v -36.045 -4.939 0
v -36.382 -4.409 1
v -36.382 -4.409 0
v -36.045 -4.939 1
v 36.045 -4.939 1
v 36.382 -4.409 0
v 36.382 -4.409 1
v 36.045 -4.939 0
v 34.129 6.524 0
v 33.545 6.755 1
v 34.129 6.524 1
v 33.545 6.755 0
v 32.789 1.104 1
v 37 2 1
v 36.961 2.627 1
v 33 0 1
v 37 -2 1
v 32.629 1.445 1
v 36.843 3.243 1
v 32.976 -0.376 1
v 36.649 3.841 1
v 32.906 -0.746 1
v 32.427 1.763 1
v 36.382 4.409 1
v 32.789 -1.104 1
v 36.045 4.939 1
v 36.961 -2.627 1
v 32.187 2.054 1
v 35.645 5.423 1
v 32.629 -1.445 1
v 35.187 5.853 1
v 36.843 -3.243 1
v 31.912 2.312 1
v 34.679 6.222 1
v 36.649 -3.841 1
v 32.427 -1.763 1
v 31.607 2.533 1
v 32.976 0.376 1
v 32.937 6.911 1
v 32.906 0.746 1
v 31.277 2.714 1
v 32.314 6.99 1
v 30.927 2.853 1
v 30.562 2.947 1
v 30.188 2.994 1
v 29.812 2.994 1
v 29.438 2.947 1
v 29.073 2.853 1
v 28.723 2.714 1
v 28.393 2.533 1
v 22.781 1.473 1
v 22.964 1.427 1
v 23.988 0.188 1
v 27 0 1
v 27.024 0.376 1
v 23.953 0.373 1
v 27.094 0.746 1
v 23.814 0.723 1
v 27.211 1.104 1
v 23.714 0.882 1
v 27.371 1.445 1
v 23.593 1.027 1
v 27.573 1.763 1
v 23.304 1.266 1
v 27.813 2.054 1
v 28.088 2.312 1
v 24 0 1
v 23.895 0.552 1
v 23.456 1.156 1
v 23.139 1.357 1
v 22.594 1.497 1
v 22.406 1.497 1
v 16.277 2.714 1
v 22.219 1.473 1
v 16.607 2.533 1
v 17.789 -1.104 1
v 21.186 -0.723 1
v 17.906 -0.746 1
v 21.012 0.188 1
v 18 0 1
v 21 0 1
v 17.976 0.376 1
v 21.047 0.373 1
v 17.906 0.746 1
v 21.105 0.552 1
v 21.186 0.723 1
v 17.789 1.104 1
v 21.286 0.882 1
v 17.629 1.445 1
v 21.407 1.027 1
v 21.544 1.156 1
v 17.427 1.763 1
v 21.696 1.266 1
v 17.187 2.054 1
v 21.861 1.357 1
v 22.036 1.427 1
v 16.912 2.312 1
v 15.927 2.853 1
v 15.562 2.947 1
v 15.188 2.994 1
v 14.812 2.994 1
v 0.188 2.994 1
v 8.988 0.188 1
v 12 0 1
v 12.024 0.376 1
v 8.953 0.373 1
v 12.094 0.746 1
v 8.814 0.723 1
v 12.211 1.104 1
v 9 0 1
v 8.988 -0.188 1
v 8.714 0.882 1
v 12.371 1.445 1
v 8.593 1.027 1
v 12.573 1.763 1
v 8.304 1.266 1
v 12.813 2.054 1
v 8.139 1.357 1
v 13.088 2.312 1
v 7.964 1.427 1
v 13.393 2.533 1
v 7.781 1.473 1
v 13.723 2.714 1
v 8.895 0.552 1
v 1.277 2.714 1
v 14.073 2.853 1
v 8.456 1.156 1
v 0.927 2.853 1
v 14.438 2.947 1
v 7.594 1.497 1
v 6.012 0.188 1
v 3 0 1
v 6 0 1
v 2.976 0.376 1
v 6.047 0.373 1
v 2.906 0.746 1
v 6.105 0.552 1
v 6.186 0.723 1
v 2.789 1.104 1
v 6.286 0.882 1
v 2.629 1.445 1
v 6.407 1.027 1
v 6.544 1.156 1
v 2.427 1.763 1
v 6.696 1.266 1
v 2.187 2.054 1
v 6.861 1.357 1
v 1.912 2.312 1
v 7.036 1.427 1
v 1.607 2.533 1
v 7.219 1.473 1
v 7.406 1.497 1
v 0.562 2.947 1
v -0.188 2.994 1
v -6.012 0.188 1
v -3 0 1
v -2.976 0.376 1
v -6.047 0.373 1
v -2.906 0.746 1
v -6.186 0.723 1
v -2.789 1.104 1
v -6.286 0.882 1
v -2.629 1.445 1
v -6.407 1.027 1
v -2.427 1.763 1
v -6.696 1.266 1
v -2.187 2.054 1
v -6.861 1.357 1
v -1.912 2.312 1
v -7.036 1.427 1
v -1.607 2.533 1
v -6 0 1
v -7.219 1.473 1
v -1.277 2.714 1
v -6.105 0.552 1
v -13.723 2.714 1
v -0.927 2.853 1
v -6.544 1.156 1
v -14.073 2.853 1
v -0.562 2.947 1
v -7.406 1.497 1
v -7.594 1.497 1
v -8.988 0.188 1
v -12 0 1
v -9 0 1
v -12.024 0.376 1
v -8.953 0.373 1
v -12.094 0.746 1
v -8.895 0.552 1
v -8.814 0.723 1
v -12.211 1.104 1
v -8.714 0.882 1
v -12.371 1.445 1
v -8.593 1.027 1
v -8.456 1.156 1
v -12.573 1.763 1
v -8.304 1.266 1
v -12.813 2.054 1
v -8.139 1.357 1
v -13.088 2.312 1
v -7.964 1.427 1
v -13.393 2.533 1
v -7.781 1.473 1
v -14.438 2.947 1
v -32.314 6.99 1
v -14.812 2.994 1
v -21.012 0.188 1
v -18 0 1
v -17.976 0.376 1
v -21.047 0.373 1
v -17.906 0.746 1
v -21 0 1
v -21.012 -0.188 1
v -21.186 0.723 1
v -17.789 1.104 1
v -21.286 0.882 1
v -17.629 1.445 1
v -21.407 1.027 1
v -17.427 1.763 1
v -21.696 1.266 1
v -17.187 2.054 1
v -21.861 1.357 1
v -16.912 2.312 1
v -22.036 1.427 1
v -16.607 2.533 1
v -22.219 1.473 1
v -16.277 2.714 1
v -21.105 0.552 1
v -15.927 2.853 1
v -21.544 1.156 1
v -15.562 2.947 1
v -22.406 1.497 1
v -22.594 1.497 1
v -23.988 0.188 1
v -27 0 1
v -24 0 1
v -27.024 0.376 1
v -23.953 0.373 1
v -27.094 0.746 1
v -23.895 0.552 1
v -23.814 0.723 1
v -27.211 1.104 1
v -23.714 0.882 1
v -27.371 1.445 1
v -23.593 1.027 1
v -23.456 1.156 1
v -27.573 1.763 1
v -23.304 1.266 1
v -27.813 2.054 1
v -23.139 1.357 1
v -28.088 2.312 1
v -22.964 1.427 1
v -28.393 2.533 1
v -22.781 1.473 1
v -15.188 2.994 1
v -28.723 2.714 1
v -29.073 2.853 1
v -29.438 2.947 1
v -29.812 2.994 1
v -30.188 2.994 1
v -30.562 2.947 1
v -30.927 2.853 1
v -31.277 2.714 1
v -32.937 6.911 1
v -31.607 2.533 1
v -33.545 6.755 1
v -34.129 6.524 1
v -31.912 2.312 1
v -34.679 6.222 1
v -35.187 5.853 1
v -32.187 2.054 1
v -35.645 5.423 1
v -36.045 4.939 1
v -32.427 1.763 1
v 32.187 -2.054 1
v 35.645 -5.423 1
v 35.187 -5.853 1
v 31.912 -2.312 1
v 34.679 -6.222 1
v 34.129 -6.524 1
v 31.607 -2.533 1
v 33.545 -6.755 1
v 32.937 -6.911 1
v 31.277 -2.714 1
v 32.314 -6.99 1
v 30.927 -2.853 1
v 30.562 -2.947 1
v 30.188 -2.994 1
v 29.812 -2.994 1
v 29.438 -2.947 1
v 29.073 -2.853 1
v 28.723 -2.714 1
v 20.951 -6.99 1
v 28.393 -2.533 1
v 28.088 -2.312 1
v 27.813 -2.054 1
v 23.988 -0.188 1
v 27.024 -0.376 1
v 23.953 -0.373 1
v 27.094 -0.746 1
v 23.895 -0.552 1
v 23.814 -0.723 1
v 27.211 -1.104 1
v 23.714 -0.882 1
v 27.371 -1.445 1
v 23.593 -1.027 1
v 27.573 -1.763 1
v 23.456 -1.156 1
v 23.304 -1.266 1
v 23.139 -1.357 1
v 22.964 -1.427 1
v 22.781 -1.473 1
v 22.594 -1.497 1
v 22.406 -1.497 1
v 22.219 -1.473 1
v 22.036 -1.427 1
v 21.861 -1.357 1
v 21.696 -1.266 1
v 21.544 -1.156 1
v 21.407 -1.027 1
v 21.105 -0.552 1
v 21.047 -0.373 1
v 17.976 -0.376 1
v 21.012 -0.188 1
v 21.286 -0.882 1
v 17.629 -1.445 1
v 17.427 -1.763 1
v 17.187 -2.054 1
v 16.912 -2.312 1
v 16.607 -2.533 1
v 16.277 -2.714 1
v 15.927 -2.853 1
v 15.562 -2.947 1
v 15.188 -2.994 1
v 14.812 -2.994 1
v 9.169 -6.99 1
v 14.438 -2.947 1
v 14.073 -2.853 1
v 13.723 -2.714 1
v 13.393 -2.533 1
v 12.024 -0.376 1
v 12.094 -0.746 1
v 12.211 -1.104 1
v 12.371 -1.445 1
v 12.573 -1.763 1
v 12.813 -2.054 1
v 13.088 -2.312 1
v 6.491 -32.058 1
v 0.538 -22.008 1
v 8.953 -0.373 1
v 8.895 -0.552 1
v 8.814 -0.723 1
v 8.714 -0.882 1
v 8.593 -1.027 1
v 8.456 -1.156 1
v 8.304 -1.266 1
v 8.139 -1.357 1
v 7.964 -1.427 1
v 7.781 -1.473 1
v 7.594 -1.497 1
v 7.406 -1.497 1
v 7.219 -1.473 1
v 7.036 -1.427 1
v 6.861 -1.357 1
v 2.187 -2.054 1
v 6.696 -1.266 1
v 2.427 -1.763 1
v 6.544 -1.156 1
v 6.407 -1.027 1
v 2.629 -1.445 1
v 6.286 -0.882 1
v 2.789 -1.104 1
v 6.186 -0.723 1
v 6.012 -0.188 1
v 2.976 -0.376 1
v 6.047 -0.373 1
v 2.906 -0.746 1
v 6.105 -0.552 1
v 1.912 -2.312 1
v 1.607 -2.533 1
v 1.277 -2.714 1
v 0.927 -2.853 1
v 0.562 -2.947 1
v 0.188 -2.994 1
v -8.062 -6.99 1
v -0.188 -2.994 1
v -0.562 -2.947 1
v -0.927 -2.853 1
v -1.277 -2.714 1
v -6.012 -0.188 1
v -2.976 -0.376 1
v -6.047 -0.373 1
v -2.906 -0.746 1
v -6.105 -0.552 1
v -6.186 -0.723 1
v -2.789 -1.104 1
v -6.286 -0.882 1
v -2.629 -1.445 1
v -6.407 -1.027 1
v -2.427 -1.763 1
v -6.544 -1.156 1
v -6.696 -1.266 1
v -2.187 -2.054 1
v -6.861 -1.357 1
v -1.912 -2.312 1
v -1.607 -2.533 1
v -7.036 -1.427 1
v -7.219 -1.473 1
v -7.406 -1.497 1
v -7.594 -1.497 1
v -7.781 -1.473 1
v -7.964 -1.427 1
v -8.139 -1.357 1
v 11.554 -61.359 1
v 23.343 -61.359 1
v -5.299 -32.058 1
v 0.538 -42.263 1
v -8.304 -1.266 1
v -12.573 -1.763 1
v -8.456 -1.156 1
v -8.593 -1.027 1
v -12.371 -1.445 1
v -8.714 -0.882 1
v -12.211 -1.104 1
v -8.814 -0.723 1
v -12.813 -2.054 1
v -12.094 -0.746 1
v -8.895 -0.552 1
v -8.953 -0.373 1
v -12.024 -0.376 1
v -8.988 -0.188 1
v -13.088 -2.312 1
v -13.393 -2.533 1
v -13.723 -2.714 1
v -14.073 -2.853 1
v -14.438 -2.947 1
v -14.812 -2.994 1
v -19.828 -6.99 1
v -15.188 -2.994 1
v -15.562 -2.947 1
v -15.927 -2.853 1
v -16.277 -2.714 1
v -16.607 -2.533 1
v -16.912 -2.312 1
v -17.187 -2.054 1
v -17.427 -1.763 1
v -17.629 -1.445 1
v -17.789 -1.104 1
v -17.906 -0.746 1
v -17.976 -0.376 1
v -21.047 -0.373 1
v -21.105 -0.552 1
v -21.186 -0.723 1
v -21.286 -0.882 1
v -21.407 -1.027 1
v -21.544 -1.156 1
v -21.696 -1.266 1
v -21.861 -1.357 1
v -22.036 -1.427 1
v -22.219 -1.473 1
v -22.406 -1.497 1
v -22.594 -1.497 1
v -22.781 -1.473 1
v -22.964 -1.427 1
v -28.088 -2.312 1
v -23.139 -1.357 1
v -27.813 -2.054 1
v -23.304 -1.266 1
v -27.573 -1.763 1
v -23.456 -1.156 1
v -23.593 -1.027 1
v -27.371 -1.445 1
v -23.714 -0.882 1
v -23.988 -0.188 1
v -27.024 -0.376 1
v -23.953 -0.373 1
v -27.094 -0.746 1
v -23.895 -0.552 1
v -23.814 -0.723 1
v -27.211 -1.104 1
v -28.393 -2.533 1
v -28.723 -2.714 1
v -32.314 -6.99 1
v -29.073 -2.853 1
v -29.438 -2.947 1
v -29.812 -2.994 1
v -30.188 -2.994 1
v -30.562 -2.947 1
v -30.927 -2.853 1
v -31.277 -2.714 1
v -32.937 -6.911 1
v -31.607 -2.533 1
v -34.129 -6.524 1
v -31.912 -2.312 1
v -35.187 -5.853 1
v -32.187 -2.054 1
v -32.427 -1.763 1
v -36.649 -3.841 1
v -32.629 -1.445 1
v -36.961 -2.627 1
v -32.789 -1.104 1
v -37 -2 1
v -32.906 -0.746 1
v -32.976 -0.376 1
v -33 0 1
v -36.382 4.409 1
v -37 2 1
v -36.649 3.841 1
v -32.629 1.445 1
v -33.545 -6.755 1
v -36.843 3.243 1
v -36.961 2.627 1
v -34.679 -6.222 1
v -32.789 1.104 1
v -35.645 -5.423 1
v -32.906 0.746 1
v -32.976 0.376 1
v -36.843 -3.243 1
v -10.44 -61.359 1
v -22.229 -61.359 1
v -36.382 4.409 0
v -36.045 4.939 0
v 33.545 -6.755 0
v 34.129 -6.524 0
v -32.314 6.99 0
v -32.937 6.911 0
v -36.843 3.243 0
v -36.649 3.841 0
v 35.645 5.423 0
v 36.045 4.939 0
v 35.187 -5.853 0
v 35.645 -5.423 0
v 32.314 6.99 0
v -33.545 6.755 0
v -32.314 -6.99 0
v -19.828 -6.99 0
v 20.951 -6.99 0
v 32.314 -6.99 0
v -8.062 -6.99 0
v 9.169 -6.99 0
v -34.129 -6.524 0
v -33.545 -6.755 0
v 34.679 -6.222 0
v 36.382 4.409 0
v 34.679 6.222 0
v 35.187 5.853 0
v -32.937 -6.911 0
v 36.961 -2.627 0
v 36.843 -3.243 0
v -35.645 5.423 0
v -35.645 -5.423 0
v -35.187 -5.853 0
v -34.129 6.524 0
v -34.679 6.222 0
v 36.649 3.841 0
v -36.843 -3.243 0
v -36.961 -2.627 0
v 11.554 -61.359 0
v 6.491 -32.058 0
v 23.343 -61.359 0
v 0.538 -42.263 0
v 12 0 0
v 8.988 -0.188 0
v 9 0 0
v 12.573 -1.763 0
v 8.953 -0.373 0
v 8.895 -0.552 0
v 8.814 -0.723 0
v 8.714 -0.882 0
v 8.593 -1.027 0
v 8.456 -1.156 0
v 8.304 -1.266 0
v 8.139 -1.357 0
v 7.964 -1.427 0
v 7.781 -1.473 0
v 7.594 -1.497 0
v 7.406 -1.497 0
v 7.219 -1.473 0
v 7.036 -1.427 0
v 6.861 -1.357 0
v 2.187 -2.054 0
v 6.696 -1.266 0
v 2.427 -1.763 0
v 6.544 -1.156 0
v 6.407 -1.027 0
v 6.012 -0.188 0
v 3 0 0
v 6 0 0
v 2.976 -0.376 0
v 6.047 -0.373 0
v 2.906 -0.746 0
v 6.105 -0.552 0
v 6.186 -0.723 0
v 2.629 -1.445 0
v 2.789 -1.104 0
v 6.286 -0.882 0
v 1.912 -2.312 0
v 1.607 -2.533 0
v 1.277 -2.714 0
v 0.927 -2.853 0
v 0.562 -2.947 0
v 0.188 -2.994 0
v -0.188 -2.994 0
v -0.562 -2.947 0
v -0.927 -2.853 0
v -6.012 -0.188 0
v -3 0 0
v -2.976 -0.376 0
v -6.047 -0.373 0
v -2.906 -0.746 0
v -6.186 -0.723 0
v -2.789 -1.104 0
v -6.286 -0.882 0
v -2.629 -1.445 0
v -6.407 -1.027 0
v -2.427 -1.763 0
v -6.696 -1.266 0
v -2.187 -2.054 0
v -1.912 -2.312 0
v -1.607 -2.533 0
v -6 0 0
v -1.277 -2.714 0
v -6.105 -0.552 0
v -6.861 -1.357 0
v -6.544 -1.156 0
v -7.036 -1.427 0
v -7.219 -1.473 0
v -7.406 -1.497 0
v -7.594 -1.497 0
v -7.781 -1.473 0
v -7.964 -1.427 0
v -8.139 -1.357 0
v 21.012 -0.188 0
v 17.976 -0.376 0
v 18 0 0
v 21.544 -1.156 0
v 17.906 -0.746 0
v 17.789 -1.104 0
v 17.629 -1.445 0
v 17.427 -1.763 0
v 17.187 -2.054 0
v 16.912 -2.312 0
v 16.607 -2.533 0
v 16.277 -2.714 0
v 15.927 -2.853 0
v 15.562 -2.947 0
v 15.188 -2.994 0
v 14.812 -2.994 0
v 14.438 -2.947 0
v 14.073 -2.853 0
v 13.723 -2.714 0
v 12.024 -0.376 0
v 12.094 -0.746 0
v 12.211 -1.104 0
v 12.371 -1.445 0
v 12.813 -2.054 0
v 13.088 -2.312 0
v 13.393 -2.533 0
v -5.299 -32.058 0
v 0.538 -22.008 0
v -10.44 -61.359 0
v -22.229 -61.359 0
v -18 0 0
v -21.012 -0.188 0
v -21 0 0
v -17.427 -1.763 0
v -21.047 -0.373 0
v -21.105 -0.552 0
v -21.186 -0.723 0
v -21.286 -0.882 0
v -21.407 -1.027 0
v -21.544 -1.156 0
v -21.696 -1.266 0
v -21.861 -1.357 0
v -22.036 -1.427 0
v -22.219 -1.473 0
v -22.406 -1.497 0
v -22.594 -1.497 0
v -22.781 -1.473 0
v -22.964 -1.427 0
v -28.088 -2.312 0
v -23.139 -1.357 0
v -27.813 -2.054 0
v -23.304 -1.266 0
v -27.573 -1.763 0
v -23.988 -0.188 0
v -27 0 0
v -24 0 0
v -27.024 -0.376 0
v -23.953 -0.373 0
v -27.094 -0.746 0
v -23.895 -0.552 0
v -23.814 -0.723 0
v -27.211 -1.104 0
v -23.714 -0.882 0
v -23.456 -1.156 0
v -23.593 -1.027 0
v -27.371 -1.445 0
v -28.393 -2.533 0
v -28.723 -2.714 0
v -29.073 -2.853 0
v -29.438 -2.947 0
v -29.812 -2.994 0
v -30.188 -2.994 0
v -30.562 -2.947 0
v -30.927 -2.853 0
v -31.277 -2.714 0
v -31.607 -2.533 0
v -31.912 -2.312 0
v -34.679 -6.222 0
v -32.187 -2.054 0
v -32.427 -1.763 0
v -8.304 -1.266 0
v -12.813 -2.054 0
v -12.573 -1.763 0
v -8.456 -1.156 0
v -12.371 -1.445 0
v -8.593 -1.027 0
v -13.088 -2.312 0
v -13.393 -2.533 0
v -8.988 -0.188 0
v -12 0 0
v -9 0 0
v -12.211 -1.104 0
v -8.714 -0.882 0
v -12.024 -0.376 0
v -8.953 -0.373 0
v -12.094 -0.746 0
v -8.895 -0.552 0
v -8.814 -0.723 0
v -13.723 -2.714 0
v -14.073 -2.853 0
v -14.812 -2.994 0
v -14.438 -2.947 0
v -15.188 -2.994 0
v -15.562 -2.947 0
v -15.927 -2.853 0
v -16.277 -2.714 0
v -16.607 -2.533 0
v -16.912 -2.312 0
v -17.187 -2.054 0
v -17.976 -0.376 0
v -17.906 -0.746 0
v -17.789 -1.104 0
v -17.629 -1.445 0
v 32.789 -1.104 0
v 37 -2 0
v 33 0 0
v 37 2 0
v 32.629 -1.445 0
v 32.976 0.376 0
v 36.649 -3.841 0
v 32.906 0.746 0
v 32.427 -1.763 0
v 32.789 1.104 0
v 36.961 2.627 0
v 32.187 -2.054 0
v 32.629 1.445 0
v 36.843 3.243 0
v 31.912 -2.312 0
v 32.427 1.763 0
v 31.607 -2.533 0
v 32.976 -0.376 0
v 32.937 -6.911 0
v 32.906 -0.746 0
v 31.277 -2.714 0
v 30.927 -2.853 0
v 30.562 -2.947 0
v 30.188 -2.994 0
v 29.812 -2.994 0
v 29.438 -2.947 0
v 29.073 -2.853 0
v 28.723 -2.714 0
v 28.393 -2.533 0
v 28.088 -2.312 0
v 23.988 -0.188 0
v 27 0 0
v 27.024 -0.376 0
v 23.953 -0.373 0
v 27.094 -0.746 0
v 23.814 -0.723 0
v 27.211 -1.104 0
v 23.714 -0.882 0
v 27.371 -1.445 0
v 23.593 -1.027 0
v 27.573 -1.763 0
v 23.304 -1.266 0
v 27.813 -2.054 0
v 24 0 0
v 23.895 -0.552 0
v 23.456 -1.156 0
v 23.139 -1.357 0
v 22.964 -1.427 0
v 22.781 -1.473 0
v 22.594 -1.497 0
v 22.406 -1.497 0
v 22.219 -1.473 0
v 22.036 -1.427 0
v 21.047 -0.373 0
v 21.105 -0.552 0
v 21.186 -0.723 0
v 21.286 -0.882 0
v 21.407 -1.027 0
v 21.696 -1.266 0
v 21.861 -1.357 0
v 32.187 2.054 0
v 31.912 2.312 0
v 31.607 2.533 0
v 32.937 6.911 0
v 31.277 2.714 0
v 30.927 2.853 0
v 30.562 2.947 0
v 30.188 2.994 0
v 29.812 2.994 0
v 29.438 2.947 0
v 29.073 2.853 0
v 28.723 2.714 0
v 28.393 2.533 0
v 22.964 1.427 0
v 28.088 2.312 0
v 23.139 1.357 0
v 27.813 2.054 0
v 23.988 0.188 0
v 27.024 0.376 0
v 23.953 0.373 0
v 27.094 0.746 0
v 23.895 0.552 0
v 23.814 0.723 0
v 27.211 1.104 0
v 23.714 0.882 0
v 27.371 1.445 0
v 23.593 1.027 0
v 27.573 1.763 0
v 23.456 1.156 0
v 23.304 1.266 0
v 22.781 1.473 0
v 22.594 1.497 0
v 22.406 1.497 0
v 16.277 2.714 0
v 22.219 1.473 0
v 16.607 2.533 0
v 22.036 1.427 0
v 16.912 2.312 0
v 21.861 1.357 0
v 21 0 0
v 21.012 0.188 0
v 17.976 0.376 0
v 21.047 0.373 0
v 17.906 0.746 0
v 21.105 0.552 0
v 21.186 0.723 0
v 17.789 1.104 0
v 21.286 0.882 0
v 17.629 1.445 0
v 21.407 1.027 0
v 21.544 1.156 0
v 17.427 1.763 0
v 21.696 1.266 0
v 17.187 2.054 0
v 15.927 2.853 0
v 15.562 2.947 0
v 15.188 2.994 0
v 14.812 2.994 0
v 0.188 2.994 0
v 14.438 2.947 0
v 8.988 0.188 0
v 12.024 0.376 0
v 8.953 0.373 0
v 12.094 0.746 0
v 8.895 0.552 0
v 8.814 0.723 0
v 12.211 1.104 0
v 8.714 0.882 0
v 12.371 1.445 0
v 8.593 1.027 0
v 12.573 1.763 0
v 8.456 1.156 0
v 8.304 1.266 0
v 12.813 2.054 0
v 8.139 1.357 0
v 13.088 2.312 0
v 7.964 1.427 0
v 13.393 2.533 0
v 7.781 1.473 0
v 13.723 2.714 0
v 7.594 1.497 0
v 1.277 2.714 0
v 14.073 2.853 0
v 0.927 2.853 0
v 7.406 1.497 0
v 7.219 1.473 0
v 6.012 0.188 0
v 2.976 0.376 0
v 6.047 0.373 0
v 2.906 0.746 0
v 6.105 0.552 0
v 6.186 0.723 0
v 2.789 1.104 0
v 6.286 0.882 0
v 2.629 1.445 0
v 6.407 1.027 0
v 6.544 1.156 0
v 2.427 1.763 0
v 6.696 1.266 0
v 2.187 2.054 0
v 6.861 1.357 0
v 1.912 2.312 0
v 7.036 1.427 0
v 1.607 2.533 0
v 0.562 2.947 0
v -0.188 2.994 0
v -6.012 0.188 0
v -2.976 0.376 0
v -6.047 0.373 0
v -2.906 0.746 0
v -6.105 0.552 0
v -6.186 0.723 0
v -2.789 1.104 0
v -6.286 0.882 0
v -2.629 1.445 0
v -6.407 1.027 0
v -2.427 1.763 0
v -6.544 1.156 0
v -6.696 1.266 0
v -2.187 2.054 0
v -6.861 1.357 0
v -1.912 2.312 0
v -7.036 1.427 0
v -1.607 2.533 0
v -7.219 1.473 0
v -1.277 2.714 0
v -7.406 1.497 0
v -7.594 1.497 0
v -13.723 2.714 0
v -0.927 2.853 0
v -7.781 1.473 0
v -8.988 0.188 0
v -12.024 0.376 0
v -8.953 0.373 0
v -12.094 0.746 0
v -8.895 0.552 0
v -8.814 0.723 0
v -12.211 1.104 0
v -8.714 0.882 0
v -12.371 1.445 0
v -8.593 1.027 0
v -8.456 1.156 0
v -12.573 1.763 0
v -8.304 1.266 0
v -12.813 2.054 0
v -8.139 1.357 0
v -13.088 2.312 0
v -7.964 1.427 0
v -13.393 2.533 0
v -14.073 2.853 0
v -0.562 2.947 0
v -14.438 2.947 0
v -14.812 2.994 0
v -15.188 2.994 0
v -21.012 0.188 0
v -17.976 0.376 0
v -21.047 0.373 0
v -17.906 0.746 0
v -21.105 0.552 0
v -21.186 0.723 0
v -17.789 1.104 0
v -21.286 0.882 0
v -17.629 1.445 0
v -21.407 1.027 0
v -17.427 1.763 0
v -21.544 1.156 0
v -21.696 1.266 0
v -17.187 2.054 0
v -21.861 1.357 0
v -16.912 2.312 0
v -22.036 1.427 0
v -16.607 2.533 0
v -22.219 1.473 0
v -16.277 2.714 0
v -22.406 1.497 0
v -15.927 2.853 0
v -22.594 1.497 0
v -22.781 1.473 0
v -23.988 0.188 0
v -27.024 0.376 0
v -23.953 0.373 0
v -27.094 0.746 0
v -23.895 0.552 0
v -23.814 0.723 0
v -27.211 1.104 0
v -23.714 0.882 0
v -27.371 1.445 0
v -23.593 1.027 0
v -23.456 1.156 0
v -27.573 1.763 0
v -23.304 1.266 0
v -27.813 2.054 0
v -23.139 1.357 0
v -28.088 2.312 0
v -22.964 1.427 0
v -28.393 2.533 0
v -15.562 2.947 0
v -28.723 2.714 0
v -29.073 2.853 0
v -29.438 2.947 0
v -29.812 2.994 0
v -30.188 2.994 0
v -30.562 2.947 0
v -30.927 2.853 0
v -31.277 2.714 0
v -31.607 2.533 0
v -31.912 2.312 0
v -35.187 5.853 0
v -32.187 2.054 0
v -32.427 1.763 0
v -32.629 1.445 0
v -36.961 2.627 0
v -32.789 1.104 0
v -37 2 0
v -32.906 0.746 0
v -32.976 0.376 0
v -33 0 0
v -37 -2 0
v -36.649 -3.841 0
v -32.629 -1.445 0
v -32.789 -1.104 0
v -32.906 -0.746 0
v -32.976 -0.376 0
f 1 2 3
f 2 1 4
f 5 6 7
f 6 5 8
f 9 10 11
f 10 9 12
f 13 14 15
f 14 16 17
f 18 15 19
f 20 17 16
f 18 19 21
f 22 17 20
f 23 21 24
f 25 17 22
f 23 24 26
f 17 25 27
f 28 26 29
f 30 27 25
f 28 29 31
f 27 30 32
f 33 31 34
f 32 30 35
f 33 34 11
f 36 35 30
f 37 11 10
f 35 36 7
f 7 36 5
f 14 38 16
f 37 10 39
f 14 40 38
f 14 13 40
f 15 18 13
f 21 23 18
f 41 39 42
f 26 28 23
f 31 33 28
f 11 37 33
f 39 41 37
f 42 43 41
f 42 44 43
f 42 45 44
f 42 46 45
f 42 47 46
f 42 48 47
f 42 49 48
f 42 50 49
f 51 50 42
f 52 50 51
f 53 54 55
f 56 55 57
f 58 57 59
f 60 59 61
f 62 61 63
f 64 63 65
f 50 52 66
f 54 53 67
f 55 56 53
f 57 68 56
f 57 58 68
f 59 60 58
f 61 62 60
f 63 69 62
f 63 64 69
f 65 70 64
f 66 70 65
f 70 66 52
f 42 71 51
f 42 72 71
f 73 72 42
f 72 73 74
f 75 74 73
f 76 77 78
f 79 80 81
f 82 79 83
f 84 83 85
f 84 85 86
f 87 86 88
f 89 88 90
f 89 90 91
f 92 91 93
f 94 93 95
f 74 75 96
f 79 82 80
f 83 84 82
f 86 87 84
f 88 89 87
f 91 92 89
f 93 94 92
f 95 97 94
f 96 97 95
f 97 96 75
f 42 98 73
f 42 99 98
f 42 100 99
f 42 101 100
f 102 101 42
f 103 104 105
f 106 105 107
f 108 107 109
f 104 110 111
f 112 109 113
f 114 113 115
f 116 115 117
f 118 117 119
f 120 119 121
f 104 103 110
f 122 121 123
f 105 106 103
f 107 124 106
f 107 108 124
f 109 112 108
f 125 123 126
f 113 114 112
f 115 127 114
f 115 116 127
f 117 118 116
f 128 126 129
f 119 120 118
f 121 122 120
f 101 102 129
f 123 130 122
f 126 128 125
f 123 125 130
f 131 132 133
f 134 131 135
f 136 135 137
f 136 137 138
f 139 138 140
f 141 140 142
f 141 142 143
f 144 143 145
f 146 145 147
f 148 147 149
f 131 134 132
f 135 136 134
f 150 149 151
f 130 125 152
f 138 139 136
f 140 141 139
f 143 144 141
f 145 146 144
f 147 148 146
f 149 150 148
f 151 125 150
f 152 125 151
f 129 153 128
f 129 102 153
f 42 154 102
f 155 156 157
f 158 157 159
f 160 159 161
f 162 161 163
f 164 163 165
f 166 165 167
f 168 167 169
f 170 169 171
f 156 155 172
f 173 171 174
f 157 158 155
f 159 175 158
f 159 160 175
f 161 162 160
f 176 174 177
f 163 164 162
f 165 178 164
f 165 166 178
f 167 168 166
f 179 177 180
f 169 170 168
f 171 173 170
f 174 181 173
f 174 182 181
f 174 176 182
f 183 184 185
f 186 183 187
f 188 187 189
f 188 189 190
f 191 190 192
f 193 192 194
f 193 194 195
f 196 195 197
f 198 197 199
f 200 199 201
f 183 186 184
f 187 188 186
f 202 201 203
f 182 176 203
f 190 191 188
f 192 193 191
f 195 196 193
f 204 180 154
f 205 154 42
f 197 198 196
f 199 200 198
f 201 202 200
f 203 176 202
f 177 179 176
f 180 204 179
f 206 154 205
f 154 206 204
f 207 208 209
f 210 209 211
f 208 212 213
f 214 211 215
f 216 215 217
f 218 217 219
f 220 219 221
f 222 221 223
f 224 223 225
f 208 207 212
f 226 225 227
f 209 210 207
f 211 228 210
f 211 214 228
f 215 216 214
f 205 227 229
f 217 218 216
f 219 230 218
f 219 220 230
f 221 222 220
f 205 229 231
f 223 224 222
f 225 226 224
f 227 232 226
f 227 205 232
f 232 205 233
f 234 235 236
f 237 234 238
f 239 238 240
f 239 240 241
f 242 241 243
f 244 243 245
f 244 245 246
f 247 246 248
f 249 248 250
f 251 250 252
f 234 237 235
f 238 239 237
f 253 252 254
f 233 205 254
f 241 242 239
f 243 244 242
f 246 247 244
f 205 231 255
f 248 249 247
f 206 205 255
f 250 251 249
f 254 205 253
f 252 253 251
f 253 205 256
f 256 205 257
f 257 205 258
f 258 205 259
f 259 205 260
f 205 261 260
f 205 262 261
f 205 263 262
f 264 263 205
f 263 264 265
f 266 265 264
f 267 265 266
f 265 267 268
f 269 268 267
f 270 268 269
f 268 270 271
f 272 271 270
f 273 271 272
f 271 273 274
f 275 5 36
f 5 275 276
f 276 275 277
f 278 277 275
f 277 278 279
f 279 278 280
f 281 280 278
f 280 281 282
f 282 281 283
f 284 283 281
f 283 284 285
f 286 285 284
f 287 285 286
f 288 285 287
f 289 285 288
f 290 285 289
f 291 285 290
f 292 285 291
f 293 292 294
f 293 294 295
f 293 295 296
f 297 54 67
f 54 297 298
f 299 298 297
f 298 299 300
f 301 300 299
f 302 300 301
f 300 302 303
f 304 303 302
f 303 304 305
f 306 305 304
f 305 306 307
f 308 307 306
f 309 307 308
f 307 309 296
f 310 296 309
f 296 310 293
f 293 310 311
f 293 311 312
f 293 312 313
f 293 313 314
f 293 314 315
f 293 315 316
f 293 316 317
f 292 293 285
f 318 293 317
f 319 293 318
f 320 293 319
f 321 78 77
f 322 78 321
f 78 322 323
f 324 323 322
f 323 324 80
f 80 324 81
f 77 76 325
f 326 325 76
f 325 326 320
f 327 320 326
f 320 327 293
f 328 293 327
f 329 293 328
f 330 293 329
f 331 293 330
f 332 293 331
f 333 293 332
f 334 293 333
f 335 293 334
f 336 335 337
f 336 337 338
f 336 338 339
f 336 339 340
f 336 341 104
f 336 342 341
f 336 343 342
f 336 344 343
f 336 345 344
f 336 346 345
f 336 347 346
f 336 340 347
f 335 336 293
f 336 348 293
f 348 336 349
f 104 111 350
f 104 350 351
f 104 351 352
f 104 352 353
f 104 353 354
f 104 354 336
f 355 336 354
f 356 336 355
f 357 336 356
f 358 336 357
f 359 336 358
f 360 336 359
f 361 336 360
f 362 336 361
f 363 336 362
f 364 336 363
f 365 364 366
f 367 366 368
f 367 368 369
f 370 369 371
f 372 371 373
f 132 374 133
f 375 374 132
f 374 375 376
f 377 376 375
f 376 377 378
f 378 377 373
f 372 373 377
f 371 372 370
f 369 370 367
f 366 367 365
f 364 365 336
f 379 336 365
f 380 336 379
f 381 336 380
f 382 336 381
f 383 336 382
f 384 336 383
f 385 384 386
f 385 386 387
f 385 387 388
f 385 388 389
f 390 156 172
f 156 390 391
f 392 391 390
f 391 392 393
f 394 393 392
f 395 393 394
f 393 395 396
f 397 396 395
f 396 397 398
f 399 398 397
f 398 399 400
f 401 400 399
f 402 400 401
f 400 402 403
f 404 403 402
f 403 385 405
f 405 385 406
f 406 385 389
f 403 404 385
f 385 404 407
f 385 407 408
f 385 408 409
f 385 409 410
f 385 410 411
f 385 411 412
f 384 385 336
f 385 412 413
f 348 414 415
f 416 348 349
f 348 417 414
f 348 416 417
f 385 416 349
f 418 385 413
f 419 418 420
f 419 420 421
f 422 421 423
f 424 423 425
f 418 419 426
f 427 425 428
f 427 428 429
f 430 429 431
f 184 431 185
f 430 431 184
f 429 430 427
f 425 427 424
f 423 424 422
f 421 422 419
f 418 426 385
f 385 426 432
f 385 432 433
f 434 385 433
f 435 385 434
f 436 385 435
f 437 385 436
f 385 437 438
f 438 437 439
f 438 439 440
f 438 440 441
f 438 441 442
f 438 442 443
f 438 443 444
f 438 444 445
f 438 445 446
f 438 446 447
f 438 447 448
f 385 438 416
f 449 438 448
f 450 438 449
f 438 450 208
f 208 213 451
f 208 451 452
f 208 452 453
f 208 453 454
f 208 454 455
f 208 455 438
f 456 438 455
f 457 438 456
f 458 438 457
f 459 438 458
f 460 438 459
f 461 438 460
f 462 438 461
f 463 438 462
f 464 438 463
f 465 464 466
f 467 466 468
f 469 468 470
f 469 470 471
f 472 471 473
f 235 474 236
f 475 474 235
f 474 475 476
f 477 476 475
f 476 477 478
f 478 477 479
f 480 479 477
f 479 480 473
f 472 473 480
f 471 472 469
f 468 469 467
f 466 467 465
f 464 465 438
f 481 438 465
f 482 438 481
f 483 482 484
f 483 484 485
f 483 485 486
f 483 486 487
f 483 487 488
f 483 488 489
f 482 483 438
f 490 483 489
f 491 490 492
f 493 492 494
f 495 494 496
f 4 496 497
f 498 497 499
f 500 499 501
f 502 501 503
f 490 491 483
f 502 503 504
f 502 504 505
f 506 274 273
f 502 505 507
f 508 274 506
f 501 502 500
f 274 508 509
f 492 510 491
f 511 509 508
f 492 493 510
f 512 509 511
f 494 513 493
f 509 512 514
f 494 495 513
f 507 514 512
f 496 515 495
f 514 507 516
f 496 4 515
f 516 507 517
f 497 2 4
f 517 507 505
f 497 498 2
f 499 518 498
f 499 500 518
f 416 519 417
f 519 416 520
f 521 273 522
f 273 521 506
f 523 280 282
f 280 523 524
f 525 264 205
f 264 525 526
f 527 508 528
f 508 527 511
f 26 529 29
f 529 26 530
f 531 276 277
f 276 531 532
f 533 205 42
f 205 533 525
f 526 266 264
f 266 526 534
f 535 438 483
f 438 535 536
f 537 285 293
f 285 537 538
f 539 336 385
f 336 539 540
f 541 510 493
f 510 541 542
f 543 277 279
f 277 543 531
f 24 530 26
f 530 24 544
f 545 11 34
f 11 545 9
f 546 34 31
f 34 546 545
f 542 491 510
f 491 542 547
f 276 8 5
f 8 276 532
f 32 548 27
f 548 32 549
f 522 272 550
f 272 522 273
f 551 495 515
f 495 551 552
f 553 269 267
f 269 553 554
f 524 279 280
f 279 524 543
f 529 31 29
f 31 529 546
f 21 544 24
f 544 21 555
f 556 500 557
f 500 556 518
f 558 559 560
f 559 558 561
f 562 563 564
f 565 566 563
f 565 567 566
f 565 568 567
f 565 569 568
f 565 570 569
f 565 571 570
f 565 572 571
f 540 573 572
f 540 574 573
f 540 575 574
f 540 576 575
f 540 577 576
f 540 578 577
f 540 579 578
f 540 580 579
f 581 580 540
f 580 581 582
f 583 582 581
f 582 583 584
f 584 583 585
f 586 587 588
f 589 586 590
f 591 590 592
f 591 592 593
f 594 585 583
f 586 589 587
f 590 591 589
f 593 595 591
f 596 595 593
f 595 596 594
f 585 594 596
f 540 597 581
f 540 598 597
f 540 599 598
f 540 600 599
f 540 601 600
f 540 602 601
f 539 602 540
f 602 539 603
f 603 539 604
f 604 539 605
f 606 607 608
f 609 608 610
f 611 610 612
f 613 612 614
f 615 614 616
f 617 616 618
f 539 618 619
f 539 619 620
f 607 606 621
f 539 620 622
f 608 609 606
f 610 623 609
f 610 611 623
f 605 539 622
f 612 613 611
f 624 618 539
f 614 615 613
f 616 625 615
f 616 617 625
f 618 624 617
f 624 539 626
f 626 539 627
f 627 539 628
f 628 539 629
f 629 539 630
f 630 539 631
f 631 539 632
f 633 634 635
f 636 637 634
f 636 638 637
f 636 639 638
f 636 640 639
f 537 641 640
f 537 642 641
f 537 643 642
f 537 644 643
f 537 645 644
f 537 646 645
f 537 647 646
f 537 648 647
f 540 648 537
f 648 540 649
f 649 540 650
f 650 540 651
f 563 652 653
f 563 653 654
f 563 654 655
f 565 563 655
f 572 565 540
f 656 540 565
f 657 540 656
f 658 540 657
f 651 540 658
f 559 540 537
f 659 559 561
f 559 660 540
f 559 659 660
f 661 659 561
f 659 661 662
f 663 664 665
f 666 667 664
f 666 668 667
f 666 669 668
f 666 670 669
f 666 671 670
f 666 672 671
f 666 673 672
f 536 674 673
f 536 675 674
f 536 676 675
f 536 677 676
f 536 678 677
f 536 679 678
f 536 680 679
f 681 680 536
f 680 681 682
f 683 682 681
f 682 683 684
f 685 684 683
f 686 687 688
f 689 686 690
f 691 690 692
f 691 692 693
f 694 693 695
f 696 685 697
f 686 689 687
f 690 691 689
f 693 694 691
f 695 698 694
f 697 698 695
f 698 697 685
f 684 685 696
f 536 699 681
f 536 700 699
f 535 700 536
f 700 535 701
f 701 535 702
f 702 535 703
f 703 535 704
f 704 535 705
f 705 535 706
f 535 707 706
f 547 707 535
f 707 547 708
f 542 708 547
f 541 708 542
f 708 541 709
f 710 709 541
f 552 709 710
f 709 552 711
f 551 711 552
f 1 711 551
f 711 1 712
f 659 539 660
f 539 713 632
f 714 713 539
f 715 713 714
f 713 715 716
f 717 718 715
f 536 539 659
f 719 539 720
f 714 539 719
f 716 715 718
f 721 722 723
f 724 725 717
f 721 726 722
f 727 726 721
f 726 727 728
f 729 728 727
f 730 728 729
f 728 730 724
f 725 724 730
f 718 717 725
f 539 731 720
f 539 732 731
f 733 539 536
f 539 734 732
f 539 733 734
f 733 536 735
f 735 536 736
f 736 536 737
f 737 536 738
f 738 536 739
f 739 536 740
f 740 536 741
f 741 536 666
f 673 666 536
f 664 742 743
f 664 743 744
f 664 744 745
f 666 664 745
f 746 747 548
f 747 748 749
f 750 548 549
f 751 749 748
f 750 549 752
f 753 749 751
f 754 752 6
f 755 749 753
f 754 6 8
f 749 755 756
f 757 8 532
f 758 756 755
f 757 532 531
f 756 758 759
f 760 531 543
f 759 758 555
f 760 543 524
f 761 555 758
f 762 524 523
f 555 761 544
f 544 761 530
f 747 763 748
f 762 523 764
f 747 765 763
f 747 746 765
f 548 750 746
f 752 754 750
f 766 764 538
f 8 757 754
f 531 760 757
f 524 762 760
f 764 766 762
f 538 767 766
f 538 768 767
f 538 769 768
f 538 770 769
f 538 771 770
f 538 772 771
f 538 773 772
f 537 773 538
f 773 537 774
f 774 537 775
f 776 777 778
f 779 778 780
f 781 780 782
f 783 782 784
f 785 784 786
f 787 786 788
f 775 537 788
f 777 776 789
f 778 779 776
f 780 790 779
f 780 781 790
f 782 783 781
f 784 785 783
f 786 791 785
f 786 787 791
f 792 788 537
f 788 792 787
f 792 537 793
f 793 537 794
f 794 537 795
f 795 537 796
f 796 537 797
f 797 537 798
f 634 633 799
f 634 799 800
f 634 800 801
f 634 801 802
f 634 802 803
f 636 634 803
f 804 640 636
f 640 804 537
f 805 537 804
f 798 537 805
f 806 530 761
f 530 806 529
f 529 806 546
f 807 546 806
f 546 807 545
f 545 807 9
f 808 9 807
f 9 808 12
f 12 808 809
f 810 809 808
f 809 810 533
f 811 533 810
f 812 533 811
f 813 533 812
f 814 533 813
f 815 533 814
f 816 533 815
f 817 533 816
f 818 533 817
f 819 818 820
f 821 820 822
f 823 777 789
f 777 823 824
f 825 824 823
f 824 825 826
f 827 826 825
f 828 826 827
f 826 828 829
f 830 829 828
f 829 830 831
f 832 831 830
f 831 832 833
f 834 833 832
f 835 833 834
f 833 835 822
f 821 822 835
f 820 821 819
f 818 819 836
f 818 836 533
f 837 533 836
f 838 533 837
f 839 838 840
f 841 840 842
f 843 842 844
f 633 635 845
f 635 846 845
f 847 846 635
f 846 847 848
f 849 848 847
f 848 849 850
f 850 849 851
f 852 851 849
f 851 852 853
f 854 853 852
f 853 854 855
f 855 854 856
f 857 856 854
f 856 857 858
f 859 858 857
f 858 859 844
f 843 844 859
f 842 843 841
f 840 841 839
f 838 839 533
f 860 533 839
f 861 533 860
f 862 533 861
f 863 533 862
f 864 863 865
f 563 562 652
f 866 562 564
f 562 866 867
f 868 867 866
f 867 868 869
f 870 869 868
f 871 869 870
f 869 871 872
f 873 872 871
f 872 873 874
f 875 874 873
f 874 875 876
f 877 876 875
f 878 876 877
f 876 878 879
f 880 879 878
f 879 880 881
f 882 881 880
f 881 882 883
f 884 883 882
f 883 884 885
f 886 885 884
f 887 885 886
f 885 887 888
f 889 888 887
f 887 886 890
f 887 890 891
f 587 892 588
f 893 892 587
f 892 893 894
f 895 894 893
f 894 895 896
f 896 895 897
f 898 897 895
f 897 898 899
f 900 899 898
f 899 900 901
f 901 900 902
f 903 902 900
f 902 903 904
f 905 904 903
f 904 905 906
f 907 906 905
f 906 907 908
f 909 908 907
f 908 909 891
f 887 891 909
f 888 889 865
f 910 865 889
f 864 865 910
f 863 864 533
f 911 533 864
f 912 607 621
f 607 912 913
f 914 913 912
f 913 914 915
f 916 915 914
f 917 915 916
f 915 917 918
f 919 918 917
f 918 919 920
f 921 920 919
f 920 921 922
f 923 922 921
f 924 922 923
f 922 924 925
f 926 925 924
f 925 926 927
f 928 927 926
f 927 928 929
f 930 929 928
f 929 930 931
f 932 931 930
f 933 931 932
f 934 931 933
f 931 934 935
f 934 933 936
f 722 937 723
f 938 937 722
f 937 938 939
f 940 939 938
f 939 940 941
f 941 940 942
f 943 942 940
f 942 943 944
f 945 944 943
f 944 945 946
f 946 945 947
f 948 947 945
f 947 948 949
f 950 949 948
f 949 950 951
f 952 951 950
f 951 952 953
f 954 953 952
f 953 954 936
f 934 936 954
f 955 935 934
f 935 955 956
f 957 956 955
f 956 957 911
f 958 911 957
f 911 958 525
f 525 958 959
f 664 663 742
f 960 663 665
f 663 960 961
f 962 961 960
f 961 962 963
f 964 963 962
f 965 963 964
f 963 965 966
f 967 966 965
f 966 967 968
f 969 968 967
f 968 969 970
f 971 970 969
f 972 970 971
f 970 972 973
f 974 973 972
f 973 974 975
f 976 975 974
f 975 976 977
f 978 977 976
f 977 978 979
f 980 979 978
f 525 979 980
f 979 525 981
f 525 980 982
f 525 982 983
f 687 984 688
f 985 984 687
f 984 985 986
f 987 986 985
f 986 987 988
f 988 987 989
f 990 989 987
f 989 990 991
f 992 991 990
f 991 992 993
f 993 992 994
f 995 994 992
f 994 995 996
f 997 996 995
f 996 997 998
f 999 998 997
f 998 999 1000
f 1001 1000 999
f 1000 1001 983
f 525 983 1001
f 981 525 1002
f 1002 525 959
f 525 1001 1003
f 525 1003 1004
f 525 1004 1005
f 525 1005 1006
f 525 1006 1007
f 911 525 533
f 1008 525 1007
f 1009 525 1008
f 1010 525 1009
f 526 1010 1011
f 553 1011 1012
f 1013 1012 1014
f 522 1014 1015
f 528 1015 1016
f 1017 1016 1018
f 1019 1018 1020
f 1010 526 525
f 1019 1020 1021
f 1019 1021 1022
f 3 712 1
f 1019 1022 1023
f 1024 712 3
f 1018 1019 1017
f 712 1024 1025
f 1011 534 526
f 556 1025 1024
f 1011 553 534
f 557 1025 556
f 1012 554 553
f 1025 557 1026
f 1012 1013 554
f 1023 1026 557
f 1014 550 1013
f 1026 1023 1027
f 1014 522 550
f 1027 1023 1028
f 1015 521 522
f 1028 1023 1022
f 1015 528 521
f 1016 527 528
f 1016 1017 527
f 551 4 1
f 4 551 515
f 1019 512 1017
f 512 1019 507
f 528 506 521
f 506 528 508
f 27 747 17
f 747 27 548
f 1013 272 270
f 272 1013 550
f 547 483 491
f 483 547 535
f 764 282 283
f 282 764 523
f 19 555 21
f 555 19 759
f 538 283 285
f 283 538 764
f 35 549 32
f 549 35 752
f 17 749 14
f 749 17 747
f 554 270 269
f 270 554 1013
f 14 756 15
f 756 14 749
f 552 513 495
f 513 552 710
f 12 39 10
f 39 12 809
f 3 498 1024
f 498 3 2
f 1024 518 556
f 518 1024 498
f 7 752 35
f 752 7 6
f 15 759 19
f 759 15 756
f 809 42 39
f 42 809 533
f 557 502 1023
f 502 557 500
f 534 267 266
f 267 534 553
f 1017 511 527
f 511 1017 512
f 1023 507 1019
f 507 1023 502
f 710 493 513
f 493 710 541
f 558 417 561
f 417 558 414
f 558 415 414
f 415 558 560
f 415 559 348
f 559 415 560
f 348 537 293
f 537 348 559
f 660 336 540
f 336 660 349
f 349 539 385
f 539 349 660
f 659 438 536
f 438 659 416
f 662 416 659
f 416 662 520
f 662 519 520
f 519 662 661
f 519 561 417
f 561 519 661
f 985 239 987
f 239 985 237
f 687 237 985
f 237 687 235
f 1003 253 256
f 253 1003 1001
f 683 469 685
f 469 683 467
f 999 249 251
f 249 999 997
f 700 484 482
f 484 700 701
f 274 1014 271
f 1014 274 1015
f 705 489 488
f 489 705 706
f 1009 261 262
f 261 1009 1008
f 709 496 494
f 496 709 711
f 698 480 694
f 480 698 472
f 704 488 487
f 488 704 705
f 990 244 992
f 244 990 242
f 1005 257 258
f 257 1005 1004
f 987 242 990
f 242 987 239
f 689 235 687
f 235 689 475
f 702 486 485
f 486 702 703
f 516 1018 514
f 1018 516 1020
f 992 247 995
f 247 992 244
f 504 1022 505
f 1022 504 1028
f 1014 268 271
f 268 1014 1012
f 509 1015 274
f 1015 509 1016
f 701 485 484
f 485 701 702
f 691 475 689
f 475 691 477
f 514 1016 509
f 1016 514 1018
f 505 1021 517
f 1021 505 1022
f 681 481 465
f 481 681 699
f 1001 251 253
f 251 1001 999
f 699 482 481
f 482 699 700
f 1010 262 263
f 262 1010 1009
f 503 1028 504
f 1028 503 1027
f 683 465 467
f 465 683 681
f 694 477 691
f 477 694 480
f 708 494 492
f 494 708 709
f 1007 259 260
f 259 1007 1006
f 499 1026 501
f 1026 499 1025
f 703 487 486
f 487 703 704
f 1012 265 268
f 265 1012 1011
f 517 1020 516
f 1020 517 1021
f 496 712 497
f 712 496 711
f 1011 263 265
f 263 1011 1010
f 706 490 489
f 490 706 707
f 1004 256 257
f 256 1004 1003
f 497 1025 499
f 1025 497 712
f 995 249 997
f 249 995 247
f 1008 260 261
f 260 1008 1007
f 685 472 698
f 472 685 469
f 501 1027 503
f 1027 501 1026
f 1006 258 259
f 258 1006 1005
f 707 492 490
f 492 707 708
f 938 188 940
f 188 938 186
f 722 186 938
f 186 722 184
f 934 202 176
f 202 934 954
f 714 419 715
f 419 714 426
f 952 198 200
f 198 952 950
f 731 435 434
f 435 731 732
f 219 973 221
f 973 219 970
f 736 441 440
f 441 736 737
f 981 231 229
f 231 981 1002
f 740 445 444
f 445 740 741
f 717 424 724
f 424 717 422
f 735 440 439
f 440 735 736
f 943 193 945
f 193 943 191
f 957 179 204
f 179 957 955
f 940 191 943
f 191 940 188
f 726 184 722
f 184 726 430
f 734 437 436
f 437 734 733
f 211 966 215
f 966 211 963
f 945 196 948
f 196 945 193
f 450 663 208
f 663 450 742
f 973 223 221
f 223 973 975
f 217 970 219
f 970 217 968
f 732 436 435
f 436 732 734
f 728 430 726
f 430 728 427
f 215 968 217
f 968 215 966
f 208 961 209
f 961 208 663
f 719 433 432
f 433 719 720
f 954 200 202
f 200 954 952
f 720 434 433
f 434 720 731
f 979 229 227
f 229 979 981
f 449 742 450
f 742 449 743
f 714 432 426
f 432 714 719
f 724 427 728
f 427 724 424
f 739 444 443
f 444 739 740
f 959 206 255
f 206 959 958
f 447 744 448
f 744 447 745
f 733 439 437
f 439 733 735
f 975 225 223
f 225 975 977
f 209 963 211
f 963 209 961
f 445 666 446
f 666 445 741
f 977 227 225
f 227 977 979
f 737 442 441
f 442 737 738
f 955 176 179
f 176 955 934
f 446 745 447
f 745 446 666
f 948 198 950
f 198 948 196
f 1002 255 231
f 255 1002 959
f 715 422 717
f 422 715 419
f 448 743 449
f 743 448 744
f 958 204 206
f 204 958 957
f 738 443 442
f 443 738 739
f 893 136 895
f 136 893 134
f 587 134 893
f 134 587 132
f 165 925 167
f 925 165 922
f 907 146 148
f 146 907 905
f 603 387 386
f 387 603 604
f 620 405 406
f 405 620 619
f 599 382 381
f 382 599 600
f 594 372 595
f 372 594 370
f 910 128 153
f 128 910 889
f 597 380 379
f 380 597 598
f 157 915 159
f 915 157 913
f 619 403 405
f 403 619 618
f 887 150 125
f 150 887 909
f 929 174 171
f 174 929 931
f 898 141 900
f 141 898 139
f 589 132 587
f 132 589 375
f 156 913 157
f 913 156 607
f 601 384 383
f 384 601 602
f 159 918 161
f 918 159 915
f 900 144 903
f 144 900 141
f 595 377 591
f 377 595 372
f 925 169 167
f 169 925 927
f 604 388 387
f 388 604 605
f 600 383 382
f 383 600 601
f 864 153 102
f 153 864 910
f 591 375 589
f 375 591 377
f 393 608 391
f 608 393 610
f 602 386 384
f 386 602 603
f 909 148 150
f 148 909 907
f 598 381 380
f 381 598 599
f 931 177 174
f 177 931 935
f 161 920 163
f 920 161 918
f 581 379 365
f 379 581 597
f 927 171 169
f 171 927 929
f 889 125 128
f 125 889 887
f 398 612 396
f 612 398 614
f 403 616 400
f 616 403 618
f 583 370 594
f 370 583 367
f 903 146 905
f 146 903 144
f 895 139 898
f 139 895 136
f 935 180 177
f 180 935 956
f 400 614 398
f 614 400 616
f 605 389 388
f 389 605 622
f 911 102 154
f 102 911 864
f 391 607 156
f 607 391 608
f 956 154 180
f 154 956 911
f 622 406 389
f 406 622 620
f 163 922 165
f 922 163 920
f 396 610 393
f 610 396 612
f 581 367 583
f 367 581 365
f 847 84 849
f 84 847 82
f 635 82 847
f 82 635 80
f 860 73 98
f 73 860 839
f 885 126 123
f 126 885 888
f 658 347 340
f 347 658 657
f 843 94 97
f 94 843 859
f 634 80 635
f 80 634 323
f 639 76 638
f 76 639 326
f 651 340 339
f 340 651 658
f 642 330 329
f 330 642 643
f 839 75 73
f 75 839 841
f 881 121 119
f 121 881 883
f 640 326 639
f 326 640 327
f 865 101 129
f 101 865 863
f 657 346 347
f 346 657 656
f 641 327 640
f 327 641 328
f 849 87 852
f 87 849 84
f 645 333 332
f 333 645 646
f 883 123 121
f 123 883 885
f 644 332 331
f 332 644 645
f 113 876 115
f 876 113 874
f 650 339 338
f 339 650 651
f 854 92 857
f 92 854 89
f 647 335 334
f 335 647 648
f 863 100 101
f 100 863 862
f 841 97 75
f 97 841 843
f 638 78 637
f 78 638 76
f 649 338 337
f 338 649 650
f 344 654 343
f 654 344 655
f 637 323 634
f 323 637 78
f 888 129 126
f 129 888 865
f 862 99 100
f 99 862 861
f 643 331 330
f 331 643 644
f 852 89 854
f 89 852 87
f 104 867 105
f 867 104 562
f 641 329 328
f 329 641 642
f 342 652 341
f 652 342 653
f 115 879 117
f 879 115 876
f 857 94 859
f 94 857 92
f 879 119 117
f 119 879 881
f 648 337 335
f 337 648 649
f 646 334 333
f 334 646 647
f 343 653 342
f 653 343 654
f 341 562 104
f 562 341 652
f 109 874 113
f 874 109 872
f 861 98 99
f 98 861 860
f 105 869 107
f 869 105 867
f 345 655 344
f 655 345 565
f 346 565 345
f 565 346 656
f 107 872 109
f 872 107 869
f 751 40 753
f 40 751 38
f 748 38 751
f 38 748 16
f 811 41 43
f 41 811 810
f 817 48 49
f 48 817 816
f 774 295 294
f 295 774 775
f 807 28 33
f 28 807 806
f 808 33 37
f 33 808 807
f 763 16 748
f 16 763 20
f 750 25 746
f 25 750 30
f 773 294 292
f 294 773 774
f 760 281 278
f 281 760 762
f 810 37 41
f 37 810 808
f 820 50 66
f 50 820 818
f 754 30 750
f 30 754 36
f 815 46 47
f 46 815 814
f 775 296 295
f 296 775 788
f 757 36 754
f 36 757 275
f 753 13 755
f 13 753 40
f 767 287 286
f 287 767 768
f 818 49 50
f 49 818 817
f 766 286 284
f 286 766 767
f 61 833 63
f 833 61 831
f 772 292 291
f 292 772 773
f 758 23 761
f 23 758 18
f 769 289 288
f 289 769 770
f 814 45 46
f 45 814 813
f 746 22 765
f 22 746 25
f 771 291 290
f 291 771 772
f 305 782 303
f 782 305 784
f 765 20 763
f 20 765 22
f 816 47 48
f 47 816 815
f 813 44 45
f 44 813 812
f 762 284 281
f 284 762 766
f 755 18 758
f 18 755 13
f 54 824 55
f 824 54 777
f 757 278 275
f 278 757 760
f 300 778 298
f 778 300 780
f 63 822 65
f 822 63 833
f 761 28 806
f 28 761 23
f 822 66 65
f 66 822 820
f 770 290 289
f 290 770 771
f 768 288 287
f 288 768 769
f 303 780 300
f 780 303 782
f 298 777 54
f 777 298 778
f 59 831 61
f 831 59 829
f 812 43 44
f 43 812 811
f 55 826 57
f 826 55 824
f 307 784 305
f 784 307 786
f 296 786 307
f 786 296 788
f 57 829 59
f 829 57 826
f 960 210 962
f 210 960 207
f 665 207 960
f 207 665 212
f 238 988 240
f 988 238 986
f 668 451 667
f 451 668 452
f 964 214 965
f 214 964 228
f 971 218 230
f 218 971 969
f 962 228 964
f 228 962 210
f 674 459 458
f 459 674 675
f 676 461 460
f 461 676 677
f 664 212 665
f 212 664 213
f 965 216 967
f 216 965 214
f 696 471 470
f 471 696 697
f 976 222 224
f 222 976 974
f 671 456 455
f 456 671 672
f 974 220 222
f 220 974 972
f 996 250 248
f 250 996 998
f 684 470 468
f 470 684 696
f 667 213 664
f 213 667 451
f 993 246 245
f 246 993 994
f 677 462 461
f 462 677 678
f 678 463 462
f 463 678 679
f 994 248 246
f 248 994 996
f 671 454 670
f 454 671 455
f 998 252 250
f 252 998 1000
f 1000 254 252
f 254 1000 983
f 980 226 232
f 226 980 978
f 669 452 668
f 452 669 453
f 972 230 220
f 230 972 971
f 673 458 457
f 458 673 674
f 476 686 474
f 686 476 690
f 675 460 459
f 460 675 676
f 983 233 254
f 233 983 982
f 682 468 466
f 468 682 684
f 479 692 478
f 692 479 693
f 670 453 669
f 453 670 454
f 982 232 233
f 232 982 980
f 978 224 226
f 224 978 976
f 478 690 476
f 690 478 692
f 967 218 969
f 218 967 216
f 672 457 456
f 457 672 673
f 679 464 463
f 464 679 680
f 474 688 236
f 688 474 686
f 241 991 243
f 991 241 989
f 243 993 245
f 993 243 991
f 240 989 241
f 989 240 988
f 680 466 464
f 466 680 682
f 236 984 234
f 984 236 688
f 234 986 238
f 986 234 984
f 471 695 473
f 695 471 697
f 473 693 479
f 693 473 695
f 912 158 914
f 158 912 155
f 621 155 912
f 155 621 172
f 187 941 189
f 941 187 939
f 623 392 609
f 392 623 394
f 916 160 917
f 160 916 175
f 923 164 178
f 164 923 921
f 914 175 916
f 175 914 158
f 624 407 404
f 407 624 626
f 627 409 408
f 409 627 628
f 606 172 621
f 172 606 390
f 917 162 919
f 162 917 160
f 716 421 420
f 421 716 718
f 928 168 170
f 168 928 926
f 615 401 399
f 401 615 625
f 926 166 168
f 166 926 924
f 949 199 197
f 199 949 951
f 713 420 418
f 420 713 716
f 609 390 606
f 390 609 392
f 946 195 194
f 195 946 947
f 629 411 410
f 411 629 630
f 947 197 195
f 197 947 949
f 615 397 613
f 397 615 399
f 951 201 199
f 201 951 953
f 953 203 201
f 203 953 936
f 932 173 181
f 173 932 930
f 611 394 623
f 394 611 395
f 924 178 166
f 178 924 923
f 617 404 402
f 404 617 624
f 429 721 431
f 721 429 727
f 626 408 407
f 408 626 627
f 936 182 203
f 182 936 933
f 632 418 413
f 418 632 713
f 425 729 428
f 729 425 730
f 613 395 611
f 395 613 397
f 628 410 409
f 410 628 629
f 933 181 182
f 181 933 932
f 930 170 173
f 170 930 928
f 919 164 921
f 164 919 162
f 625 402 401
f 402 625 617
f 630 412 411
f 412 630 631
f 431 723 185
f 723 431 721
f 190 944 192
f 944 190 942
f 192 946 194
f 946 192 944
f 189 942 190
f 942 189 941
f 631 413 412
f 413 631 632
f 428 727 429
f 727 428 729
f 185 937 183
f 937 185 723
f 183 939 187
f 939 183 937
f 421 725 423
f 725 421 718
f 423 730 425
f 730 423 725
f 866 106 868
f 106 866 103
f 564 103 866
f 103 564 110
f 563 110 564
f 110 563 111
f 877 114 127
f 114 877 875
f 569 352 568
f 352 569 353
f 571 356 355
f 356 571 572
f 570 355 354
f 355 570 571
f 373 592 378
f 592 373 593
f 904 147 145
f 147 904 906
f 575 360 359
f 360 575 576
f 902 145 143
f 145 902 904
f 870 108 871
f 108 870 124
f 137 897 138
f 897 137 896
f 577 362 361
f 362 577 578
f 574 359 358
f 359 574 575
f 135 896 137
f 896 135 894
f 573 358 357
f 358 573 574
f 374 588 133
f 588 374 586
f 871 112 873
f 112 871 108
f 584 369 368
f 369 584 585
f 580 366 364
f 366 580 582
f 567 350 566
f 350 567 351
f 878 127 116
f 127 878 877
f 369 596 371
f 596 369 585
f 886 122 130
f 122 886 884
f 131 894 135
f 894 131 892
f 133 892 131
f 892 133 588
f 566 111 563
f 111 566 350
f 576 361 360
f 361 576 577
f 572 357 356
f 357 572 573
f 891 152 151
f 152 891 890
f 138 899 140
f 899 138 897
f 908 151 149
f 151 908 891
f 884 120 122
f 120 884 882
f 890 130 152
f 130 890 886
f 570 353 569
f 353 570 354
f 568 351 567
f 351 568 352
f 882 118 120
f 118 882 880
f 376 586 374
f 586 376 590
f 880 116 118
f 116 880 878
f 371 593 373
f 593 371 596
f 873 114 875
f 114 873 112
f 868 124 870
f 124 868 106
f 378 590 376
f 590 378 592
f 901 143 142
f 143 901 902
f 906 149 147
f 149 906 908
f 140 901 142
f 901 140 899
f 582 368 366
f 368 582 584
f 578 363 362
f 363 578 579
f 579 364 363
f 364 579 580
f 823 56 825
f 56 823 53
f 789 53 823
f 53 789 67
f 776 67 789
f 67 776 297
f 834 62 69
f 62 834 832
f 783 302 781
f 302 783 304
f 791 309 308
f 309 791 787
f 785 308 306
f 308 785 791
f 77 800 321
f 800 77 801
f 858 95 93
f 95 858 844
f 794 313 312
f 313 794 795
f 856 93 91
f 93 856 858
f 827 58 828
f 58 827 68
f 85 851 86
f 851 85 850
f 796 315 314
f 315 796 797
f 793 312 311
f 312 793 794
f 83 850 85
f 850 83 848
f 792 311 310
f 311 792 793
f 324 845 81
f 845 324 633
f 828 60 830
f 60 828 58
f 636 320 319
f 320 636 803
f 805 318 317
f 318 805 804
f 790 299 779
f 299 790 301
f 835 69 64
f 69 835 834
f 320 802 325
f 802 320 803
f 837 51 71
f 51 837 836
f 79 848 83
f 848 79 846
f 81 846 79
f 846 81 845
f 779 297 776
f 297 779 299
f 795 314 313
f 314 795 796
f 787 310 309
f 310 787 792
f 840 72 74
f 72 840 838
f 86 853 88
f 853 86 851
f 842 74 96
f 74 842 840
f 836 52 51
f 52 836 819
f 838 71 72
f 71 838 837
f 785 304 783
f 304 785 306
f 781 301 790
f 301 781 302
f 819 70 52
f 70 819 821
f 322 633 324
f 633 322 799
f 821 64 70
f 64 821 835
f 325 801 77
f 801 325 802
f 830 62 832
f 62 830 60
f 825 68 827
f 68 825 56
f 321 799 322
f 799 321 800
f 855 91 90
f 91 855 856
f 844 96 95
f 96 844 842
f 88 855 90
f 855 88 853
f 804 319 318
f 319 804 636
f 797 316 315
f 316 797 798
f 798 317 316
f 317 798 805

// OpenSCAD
$fn = 50;


difference() {
	union() {
		*color(alpha = 1.0000000000, c = "gray") {
			translate(v = [0, 14, 0]) {
				linear_extrude(height = 1) {
					text(font = "Arial:style=Bold", halign = "center", size = 4.5000000000, text = "COMMENT description oobb_plate_shape_p_type_1_depth_5_width_1_thickness_x_extra_oobb_size", valign = "center");
				}
			}
		}
		hull() {
			translate(v = [-32.0000000000, 2.0000000000, 0]) {
				cylinder(h = 1, r = 5);
			}
			translate(v = [32.0000000000, 2.0000000000, 0]) {
				cylinder(h = 1, r = 5);
			}
			translate(v = [-32.0000000000, -2.0000000000, 0]) {
				cylinder(h = 1, r = 5);
			}
			translate(v = [32.0000000000, -2.0000000000, 0]) {
				cylinder(h = 1, r = 5);
			}
		}
		translate(v = [0, -5, 0]) {
			linear_extrude(height = 1) {
				text(font = "DejaVu Sans Mono:style=Bold", halign = "center", size = 57.0000000000, text = "X", valign = "top");
			}
		}
	}
	union() {
		*color(alpha = 1.0000000000, c = "gray") {
			translate(v = [0, 14, 0]) {
				linear_extrude(height = 1) {
					text(font = "Arial:style=Bold", halign = "center", size = 4.5000000000, text = "COMMENT description oobb_holes_shape_n_type_5_width_1_thickness_x_extra_oobb_size_1_height_'all'_holes_true_both_holes", valign = "center");
				}
			}
		}
		translate(v = [-30.0000000000, 0.0000000000, 0]) {
			translate(v = [0, 0, -50]) {
				cylinder(h = 100, r = 3.0000000000);
			}
		}
		translate(v = [-15.0000000000, 0.0000000000, 0]) {
			translate(v = [0, 0, -50]) {
				cylinder(h = 100, r = 3.0000000000);
			}
		}
		translate(v = [0, 0, -50]) {
			cylinder(h = 100, r = 3.0000000000);
		}
		translate(v = [15.0000000000, 0.0000000000, 0]) {
			translate(v = [0, 0, -50]) {
				cylinder(h = 100, r = 3.0000000000);
			}
		}
		translate(v = [30.0000000000, 0.0000000000, 0]) {
			translate(v = [0, 0, -50]) {
				cylinder(h = 100, r = 3.0000000000);
			}
		}
		translate(v = [-30.0000000000, 0.0000000000, 0]) {
			translate(v = [0, 0, -50]) {
				cylinder(h = 100, r = 1.5000000000);
			}
		}
		translate(v = [-22.5000000000, 0.0000000000, 0]) {
			translate(v = [0, 0, -50]) {
				cylinder(h = 100, r = 1.5000000000);
			}
		}
		translate(v = [-15.0000000000, 0.0000000000, 0]) {
			translate(v = [0, 0, -50]) {
				cylinder(h = 100, r = 1.5000000000);
			}
		}
		translate(v = [-7.5000000000, 0.0000000000, 0]) {
			translate(v = [0, 0, -50]) {
				cylinder(h = 100, r = 1.5000000000);
			}
		}
		translate(v = [0, 0, -50]) {
			cylinder(h = 100, r = 1.5000000000);
		}
		translate(v = [7.5000000000, 0.0000000000, 0]) {
			translate(v = [0, 0, -50]) {
				cylinder(h = 100, r = 1.5000000000);
			}
		}
		translate(v = [15.0000000000, 0.0000000000, 0]) {
			translate(v = [0, 0, -50]) {
				cylinder(h = 100, r = 1.5000000000);
			}
		}
		translate(v = [22.5000000000, 0.0000000000, 0]) {
			translate(v = [0, 0, -50]) {
				cylinder(h = 100, r = 1.5000000000);
			}
		}
		translate(v = [30.0000000000, 0.0000000000, 0]) {
			translate(v = [0, 0, -50]) {
				cylinder(h = 100, r = 1.5000000000);
			}
		}
	}
}
